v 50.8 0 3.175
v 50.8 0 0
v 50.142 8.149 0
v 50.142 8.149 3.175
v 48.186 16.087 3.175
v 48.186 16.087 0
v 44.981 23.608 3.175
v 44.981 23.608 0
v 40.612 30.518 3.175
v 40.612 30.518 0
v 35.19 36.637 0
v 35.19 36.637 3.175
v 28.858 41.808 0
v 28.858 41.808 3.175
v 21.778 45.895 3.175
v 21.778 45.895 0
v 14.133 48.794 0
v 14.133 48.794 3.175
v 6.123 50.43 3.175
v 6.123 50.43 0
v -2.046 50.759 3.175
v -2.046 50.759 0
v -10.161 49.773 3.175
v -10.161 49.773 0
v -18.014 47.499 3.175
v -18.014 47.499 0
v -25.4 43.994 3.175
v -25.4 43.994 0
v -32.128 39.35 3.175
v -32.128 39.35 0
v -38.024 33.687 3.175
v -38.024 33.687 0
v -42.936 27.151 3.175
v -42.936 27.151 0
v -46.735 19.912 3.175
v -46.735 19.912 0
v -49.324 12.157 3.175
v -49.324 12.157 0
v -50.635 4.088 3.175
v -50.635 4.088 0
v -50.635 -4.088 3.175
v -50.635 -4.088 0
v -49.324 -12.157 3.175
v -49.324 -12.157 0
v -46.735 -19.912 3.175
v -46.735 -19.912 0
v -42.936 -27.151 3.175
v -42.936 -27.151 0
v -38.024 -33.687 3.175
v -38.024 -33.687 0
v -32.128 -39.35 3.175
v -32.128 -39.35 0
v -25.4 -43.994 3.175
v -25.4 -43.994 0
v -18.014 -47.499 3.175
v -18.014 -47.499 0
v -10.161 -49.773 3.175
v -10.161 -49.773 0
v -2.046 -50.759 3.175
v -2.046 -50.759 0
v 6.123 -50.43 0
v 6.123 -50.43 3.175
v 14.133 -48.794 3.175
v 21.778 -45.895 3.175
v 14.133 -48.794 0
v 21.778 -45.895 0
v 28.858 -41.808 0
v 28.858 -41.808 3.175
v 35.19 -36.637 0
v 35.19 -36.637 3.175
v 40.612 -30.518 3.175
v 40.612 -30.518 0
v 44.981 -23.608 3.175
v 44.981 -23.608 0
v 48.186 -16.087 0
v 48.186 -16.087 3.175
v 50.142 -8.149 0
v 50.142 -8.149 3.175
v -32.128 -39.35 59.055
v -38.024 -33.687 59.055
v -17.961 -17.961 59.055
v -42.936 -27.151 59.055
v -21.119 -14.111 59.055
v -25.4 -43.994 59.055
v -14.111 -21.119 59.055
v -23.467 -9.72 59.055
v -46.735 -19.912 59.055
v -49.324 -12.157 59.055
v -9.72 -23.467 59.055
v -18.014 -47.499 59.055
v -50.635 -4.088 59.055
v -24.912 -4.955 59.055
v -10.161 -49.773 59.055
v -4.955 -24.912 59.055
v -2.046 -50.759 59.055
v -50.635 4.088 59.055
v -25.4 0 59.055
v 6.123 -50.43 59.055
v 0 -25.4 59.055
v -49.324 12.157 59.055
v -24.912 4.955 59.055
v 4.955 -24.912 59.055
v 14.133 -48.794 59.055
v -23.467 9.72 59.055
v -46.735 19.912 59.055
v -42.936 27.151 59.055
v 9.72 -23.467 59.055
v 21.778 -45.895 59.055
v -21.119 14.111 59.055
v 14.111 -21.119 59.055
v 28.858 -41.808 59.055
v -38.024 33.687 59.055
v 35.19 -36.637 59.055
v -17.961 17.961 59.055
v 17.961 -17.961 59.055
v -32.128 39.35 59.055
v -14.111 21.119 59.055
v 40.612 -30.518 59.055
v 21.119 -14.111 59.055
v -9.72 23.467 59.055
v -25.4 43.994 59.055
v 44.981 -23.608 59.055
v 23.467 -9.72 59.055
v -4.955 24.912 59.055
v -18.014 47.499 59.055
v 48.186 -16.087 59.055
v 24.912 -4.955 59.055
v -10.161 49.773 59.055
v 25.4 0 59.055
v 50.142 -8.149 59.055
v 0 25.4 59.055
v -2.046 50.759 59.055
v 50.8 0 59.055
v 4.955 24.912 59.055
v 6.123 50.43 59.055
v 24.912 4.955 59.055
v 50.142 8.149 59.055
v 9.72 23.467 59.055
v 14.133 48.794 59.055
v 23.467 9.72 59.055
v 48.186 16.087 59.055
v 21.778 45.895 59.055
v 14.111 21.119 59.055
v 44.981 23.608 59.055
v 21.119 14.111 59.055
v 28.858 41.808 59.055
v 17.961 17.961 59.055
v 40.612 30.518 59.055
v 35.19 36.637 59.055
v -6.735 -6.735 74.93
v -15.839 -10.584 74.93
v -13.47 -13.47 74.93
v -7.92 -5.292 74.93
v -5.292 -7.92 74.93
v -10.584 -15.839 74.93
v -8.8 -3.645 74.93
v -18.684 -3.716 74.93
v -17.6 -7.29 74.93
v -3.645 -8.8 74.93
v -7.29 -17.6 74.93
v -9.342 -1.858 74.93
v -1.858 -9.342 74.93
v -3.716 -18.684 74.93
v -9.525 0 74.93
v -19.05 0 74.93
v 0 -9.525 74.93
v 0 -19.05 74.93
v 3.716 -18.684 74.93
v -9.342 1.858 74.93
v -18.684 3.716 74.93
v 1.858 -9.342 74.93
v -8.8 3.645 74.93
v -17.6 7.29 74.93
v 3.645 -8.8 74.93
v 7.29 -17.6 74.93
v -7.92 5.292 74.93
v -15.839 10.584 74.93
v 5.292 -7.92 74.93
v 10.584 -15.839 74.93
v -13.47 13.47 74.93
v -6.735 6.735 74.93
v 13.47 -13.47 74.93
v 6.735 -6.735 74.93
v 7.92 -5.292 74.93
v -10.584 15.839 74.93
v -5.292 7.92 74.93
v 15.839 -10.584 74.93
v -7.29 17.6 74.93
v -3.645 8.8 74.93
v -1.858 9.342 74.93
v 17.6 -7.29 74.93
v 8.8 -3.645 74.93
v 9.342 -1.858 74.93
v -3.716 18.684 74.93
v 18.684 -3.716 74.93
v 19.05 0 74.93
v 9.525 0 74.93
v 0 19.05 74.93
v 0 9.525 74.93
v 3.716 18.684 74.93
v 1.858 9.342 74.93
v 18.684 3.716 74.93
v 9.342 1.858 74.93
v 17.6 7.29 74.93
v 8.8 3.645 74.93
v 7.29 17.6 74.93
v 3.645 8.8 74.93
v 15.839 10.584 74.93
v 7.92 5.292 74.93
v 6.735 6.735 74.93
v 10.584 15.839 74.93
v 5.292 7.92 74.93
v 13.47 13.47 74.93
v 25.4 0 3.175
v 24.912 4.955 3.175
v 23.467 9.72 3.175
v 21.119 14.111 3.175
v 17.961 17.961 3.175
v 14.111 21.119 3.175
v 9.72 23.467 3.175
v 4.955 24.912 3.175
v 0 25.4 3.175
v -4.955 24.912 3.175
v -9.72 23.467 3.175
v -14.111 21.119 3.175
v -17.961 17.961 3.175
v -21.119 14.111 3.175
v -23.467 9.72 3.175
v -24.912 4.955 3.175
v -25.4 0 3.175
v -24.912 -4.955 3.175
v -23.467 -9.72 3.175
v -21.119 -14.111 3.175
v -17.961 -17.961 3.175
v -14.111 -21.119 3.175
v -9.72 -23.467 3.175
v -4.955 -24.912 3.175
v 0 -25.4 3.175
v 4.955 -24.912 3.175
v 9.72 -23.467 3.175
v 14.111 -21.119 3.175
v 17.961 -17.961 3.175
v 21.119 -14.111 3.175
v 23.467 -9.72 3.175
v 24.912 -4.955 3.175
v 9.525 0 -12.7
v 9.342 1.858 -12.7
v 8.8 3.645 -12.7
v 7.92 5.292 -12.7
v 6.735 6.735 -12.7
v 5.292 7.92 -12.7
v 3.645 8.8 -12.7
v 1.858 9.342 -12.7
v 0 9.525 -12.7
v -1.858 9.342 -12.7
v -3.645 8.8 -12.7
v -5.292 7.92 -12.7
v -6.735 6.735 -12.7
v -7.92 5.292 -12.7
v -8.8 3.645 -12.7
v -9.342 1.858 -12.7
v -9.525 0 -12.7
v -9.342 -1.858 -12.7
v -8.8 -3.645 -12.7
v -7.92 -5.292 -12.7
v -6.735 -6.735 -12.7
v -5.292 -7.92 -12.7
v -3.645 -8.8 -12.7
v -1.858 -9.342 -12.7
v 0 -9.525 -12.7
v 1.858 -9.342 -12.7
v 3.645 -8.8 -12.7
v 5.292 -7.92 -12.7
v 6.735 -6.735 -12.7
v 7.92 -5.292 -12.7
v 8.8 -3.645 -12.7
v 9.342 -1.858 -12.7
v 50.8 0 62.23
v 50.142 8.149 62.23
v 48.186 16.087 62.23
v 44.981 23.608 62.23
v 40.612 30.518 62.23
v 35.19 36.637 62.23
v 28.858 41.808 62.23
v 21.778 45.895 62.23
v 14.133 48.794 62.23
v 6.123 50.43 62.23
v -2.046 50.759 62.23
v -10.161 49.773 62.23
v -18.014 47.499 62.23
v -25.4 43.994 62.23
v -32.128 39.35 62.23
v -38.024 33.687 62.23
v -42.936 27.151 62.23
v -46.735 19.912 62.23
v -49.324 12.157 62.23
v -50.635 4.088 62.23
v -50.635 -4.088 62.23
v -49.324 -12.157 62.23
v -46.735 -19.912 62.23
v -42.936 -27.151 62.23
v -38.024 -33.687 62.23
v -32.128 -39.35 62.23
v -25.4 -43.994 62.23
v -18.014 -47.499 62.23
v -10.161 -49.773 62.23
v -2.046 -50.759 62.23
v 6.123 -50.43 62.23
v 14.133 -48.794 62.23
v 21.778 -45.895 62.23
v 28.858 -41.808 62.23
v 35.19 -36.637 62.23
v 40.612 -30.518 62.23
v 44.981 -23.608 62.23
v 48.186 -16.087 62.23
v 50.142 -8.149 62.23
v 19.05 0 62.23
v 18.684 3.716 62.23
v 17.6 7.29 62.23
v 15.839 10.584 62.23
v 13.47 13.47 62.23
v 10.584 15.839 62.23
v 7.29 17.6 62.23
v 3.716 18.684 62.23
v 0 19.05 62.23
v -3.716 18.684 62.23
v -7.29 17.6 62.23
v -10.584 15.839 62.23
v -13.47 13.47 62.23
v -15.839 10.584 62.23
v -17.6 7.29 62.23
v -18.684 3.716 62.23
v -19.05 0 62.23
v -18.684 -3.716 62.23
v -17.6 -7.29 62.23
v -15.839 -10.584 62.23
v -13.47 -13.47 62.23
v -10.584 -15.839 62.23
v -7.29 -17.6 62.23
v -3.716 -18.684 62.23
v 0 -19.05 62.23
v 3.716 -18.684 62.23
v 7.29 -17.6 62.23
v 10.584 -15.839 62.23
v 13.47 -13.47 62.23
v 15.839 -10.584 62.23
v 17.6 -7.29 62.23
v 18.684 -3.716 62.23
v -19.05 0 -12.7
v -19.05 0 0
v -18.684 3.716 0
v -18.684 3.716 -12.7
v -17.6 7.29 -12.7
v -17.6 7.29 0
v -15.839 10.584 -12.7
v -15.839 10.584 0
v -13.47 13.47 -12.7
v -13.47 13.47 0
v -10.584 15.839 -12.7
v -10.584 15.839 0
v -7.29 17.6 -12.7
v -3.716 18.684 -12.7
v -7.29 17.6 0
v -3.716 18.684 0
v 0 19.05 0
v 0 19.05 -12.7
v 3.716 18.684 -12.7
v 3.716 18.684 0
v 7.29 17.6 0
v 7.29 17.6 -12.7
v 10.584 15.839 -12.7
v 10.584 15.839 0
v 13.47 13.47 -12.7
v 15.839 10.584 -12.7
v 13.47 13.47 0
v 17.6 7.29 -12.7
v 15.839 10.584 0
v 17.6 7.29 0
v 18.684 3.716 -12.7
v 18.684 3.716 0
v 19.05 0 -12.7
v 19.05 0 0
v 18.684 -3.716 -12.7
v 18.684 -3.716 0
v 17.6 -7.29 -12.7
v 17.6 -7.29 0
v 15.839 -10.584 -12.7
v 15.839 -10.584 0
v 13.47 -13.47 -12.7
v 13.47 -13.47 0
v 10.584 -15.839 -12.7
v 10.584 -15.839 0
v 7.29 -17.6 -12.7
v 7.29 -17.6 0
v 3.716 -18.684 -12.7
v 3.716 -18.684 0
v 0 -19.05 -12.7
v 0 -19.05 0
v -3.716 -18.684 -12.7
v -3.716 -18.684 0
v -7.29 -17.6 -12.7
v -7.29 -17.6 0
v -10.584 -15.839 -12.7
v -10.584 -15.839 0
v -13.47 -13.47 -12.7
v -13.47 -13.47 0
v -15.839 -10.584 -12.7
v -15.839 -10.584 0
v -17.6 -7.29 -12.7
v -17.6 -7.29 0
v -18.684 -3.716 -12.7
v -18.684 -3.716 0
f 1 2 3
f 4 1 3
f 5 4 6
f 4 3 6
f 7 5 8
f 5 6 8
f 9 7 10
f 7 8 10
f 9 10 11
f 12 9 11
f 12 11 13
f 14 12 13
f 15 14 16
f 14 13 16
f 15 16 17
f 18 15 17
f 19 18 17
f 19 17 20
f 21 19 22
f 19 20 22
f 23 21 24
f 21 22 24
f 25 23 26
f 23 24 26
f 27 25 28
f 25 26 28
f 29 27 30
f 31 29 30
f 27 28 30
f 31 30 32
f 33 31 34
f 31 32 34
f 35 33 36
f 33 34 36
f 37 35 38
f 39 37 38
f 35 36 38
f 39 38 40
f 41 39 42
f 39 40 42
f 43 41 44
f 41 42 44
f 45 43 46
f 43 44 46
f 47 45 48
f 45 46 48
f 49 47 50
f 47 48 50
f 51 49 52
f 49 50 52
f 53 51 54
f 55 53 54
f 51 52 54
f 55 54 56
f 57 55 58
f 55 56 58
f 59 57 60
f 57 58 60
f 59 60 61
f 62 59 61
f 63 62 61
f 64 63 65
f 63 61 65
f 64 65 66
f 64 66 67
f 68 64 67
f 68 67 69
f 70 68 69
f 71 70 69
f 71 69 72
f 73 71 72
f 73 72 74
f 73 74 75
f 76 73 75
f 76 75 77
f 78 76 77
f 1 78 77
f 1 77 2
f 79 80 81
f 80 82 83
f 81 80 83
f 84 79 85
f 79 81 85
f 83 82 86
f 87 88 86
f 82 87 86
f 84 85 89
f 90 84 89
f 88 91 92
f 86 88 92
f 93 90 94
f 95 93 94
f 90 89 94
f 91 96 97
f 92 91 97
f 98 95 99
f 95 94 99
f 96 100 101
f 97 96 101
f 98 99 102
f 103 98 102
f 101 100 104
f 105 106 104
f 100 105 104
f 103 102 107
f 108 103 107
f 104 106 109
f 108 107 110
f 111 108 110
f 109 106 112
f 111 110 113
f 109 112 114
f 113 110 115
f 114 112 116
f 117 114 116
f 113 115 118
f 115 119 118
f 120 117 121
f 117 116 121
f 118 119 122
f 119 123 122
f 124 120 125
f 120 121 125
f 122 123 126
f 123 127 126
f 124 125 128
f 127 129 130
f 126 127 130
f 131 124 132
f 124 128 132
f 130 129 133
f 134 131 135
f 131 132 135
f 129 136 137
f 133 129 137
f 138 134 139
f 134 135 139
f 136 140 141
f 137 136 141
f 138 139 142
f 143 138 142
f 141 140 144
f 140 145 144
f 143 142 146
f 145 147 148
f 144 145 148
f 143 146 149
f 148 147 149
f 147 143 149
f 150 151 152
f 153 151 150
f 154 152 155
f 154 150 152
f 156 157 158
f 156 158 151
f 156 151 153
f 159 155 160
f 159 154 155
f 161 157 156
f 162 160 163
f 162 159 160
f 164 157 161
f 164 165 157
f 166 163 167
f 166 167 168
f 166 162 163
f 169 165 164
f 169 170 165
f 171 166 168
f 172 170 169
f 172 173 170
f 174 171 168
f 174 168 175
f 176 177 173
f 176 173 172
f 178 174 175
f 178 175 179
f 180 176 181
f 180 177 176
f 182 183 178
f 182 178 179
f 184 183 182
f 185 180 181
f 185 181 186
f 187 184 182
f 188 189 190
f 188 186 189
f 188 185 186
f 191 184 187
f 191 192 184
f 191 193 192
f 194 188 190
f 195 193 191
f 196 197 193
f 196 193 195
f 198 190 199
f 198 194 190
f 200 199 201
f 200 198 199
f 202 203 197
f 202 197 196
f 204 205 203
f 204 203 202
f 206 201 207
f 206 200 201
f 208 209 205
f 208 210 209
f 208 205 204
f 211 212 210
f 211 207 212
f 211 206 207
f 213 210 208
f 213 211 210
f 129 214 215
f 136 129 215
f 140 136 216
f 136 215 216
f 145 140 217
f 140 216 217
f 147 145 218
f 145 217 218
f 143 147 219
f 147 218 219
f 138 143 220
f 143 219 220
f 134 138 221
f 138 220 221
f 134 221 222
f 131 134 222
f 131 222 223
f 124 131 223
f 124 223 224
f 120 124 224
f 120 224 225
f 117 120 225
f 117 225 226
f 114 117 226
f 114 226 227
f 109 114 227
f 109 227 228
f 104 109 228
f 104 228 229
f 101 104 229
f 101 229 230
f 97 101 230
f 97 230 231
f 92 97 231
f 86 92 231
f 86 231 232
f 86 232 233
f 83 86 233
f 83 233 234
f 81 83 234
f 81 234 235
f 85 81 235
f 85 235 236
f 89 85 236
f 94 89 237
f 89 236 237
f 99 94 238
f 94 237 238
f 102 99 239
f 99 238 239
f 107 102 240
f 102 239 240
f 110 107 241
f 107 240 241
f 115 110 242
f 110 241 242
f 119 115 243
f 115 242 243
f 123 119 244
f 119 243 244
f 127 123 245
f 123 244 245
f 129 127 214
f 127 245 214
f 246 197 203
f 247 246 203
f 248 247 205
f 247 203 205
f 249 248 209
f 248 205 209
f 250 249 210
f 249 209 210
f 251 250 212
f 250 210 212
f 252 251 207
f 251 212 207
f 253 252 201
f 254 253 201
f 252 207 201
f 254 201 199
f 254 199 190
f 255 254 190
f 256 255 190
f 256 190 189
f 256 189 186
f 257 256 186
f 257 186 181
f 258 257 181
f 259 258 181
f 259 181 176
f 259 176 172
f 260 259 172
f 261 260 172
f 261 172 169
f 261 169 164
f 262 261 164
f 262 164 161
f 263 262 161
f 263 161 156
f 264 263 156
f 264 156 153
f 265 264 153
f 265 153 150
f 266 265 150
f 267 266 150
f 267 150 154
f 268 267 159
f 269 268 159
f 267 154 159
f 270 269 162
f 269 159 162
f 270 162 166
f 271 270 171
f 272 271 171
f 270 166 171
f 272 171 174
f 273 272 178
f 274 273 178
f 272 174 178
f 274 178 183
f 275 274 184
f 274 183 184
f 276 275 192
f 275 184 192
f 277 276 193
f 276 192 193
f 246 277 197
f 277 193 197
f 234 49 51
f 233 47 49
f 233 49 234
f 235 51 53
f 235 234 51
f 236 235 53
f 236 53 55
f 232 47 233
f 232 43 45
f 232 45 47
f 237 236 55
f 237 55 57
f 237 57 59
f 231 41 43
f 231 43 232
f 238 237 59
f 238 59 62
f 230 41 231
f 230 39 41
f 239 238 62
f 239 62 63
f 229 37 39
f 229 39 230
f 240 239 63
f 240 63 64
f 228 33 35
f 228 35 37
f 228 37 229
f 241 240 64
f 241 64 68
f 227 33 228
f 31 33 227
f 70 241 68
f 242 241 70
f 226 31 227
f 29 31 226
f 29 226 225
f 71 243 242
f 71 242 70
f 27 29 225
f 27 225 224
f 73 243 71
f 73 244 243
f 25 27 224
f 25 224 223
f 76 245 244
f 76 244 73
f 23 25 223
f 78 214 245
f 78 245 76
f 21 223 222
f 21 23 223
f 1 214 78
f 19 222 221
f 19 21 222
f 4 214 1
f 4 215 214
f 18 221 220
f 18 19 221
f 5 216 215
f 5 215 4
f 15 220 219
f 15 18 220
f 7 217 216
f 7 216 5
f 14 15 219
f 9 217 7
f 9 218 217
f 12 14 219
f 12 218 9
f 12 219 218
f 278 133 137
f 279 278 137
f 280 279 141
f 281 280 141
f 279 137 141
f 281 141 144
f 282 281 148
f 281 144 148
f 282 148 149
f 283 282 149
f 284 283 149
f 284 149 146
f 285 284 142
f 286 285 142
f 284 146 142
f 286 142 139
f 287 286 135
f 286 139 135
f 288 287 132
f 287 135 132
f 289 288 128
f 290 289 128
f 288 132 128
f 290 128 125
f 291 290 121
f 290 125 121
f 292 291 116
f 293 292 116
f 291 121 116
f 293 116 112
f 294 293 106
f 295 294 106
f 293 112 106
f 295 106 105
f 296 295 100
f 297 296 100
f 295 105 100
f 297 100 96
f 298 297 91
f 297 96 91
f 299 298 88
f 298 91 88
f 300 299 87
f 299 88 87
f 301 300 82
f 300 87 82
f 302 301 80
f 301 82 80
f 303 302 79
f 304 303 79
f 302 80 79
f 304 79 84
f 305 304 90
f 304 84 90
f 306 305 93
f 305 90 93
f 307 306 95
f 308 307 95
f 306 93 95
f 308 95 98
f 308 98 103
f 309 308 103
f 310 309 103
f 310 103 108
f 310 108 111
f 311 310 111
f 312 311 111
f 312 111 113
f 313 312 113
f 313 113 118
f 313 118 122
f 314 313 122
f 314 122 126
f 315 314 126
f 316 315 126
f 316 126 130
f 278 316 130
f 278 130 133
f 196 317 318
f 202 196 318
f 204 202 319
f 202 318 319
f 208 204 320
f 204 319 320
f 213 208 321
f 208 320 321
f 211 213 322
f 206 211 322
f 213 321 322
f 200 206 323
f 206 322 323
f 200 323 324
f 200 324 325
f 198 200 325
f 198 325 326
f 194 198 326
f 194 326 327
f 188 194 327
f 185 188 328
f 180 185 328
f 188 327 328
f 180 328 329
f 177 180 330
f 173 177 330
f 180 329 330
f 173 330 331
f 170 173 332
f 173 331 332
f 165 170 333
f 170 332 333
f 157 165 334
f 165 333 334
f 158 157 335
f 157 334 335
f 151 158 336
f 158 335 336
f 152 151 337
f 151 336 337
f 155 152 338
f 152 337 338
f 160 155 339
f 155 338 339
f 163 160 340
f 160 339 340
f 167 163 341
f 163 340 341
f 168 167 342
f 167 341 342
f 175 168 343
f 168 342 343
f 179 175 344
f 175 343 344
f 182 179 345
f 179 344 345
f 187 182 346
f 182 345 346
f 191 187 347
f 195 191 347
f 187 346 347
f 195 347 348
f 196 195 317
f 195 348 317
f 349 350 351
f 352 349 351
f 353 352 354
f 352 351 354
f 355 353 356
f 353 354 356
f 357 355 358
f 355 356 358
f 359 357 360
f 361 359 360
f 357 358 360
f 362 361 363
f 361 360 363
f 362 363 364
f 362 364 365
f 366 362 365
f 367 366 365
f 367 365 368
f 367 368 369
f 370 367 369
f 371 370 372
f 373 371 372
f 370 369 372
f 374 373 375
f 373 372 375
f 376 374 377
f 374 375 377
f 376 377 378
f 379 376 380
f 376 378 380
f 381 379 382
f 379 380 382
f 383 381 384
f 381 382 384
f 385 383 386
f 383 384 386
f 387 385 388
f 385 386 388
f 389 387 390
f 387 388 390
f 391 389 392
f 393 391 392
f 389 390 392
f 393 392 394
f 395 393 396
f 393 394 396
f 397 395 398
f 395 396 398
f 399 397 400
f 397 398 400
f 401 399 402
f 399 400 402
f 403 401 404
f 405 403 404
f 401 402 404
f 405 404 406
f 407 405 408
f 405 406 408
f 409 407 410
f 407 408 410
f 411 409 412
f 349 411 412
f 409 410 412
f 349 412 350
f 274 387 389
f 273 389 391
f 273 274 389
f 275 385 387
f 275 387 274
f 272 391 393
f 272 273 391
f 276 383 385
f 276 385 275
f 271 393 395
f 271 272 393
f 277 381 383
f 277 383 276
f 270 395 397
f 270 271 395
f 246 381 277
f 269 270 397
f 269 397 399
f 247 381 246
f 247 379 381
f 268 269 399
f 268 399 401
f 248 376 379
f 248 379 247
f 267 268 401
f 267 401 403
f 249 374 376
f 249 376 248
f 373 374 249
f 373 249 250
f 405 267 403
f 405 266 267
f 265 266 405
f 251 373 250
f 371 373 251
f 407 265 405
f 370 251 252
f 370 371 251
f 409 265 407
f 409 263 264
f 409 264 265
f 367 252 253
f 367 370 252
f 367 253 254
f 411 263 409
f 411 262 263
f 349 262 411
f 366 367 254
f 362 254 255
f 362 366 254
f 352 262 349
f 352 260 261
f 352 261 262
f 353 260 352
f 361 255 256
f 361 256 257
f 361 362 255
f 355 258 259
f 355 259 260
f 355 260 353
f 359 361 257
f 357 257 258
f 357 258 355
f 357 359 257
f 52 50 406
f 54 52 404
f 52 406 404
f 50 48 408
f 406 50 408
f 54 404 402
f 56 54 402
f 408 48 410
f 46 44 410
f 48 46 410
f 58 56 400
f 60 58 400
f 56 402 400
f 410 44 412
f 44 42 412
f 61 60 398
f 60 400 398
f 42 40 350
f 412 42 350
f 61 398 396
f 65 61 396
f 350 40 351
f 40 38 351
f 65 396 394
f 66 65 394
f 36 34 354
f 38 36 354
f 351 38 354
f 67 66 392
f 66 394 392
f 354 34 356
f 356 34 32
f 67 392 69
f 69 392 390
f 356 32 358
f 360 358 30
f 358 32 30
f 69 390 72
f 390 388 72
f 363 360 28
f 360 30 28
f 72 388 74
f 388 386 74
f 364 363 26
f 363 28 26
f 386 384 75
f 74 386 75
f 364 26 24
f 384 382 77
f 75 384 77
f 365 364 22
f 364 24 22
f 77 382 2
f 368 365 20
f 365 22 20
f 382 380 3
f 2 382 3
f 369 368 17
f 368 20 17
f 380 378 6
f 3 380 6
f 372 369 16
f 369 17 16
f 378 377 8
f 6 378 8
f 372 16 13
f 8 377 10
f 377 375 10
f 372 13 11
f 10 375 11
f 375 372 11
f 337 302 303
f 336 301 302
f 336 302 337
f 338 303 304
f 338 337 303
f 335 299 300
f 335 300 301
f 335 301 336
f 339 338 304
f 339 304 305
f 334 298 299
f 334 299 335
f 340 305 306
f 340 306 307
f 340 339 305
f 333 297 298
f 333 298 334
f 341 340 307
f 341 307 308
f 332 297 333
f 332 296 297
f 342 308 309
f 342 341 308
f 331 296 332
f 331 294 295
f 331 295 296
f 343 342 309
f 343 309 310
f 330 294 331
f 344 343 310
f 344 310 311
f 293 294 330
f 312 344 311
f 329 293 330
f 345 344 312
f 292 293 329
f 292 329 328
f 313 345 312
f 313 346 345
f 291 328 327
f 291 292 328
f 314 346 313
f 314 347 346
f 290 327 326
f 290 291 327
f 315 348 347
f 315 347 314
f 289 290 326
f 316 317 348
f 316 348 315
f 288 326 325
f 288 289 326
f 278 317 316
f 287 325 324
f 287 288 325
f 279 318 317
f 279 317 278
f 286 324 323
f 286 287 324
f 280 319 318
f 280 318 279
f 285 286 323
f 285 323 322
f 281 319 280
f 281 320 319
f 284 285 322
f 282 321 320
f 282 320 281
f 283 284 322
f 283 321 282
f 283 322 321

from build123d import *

# Parameters (mm, degrees)
SKETCH1_R           = 50.8
BOSS_EXTRUDE1_DEPTH = 3.175
SKETCH3_R           = 25.4
BOSS_EXTRUDE2_DEPTH = 59.055
SKETCH4_R           = 50.8
BOSS_EXTRUDE3_DEPTH = 3.175
SKETCH5_R           = 19.05
BOSS_EXTRUDE4_DEPTH = 12.7
SKETCH6_R           = 19.05
BOSS_EXTRUDE5_DEPTH = 12.7
SKETCH7_R           = 9.525
CUT_EXTRUDE1_DEPTH  = 88.63


with BuildPart() as part:
    # Sketch1 → Boss-Extrude1 (new body)
    with BuildSketch(Plane.XY):
        Circle(SKETCH1_R)
    extrude(amount=BOSS_EXTRUDE1_DEPTH)

    # Sketch3 → Boss-Extrude2 (add)
    with BuildSketch(Plane.XY):
        Circle(SKETCH3_R)
    extrude(amount=BOSS_EXTRUDE2_DEPTH)

    # Sketch4 → Boss-Extrude3 (add)
    with BuildSketch(Plane.XY.offset(59.055)):
        Circle(SKETCH4_R)
    extrude(amount=BOSS_EXTRUDE3_DEPTH)

    # Sketch5 → Boss-Extrude4 (add)
    with BuildSketch(Plane.XY.offset(62.23)):
        Circle(SKETCH5_R)
    extrude(amount=BOSS_EXTRUDE4_DEPTH)

    # Sketch6 → Boss-Extrude5 (add)
    with BuildSketch(Plane(origin=(0, 0, 0), x_dir=(-1, 0, 0), z_dir=(0, 0, -1))):
        Circle(SKETCH6_R)
    extrude(amount=BOSS_EXTRUDE5_DEPTH)

    # Sketch7 → Cut-Extrude1 (cut, through all)
    with BuildSketch(Plane.XY.offset(74.93)):
        Circle(SKETCH7_R)
    extrude(amount=-CUT_EXTRUDE1_DEPTH, mode=Mode.SUBTRACT)


solid = part.part
